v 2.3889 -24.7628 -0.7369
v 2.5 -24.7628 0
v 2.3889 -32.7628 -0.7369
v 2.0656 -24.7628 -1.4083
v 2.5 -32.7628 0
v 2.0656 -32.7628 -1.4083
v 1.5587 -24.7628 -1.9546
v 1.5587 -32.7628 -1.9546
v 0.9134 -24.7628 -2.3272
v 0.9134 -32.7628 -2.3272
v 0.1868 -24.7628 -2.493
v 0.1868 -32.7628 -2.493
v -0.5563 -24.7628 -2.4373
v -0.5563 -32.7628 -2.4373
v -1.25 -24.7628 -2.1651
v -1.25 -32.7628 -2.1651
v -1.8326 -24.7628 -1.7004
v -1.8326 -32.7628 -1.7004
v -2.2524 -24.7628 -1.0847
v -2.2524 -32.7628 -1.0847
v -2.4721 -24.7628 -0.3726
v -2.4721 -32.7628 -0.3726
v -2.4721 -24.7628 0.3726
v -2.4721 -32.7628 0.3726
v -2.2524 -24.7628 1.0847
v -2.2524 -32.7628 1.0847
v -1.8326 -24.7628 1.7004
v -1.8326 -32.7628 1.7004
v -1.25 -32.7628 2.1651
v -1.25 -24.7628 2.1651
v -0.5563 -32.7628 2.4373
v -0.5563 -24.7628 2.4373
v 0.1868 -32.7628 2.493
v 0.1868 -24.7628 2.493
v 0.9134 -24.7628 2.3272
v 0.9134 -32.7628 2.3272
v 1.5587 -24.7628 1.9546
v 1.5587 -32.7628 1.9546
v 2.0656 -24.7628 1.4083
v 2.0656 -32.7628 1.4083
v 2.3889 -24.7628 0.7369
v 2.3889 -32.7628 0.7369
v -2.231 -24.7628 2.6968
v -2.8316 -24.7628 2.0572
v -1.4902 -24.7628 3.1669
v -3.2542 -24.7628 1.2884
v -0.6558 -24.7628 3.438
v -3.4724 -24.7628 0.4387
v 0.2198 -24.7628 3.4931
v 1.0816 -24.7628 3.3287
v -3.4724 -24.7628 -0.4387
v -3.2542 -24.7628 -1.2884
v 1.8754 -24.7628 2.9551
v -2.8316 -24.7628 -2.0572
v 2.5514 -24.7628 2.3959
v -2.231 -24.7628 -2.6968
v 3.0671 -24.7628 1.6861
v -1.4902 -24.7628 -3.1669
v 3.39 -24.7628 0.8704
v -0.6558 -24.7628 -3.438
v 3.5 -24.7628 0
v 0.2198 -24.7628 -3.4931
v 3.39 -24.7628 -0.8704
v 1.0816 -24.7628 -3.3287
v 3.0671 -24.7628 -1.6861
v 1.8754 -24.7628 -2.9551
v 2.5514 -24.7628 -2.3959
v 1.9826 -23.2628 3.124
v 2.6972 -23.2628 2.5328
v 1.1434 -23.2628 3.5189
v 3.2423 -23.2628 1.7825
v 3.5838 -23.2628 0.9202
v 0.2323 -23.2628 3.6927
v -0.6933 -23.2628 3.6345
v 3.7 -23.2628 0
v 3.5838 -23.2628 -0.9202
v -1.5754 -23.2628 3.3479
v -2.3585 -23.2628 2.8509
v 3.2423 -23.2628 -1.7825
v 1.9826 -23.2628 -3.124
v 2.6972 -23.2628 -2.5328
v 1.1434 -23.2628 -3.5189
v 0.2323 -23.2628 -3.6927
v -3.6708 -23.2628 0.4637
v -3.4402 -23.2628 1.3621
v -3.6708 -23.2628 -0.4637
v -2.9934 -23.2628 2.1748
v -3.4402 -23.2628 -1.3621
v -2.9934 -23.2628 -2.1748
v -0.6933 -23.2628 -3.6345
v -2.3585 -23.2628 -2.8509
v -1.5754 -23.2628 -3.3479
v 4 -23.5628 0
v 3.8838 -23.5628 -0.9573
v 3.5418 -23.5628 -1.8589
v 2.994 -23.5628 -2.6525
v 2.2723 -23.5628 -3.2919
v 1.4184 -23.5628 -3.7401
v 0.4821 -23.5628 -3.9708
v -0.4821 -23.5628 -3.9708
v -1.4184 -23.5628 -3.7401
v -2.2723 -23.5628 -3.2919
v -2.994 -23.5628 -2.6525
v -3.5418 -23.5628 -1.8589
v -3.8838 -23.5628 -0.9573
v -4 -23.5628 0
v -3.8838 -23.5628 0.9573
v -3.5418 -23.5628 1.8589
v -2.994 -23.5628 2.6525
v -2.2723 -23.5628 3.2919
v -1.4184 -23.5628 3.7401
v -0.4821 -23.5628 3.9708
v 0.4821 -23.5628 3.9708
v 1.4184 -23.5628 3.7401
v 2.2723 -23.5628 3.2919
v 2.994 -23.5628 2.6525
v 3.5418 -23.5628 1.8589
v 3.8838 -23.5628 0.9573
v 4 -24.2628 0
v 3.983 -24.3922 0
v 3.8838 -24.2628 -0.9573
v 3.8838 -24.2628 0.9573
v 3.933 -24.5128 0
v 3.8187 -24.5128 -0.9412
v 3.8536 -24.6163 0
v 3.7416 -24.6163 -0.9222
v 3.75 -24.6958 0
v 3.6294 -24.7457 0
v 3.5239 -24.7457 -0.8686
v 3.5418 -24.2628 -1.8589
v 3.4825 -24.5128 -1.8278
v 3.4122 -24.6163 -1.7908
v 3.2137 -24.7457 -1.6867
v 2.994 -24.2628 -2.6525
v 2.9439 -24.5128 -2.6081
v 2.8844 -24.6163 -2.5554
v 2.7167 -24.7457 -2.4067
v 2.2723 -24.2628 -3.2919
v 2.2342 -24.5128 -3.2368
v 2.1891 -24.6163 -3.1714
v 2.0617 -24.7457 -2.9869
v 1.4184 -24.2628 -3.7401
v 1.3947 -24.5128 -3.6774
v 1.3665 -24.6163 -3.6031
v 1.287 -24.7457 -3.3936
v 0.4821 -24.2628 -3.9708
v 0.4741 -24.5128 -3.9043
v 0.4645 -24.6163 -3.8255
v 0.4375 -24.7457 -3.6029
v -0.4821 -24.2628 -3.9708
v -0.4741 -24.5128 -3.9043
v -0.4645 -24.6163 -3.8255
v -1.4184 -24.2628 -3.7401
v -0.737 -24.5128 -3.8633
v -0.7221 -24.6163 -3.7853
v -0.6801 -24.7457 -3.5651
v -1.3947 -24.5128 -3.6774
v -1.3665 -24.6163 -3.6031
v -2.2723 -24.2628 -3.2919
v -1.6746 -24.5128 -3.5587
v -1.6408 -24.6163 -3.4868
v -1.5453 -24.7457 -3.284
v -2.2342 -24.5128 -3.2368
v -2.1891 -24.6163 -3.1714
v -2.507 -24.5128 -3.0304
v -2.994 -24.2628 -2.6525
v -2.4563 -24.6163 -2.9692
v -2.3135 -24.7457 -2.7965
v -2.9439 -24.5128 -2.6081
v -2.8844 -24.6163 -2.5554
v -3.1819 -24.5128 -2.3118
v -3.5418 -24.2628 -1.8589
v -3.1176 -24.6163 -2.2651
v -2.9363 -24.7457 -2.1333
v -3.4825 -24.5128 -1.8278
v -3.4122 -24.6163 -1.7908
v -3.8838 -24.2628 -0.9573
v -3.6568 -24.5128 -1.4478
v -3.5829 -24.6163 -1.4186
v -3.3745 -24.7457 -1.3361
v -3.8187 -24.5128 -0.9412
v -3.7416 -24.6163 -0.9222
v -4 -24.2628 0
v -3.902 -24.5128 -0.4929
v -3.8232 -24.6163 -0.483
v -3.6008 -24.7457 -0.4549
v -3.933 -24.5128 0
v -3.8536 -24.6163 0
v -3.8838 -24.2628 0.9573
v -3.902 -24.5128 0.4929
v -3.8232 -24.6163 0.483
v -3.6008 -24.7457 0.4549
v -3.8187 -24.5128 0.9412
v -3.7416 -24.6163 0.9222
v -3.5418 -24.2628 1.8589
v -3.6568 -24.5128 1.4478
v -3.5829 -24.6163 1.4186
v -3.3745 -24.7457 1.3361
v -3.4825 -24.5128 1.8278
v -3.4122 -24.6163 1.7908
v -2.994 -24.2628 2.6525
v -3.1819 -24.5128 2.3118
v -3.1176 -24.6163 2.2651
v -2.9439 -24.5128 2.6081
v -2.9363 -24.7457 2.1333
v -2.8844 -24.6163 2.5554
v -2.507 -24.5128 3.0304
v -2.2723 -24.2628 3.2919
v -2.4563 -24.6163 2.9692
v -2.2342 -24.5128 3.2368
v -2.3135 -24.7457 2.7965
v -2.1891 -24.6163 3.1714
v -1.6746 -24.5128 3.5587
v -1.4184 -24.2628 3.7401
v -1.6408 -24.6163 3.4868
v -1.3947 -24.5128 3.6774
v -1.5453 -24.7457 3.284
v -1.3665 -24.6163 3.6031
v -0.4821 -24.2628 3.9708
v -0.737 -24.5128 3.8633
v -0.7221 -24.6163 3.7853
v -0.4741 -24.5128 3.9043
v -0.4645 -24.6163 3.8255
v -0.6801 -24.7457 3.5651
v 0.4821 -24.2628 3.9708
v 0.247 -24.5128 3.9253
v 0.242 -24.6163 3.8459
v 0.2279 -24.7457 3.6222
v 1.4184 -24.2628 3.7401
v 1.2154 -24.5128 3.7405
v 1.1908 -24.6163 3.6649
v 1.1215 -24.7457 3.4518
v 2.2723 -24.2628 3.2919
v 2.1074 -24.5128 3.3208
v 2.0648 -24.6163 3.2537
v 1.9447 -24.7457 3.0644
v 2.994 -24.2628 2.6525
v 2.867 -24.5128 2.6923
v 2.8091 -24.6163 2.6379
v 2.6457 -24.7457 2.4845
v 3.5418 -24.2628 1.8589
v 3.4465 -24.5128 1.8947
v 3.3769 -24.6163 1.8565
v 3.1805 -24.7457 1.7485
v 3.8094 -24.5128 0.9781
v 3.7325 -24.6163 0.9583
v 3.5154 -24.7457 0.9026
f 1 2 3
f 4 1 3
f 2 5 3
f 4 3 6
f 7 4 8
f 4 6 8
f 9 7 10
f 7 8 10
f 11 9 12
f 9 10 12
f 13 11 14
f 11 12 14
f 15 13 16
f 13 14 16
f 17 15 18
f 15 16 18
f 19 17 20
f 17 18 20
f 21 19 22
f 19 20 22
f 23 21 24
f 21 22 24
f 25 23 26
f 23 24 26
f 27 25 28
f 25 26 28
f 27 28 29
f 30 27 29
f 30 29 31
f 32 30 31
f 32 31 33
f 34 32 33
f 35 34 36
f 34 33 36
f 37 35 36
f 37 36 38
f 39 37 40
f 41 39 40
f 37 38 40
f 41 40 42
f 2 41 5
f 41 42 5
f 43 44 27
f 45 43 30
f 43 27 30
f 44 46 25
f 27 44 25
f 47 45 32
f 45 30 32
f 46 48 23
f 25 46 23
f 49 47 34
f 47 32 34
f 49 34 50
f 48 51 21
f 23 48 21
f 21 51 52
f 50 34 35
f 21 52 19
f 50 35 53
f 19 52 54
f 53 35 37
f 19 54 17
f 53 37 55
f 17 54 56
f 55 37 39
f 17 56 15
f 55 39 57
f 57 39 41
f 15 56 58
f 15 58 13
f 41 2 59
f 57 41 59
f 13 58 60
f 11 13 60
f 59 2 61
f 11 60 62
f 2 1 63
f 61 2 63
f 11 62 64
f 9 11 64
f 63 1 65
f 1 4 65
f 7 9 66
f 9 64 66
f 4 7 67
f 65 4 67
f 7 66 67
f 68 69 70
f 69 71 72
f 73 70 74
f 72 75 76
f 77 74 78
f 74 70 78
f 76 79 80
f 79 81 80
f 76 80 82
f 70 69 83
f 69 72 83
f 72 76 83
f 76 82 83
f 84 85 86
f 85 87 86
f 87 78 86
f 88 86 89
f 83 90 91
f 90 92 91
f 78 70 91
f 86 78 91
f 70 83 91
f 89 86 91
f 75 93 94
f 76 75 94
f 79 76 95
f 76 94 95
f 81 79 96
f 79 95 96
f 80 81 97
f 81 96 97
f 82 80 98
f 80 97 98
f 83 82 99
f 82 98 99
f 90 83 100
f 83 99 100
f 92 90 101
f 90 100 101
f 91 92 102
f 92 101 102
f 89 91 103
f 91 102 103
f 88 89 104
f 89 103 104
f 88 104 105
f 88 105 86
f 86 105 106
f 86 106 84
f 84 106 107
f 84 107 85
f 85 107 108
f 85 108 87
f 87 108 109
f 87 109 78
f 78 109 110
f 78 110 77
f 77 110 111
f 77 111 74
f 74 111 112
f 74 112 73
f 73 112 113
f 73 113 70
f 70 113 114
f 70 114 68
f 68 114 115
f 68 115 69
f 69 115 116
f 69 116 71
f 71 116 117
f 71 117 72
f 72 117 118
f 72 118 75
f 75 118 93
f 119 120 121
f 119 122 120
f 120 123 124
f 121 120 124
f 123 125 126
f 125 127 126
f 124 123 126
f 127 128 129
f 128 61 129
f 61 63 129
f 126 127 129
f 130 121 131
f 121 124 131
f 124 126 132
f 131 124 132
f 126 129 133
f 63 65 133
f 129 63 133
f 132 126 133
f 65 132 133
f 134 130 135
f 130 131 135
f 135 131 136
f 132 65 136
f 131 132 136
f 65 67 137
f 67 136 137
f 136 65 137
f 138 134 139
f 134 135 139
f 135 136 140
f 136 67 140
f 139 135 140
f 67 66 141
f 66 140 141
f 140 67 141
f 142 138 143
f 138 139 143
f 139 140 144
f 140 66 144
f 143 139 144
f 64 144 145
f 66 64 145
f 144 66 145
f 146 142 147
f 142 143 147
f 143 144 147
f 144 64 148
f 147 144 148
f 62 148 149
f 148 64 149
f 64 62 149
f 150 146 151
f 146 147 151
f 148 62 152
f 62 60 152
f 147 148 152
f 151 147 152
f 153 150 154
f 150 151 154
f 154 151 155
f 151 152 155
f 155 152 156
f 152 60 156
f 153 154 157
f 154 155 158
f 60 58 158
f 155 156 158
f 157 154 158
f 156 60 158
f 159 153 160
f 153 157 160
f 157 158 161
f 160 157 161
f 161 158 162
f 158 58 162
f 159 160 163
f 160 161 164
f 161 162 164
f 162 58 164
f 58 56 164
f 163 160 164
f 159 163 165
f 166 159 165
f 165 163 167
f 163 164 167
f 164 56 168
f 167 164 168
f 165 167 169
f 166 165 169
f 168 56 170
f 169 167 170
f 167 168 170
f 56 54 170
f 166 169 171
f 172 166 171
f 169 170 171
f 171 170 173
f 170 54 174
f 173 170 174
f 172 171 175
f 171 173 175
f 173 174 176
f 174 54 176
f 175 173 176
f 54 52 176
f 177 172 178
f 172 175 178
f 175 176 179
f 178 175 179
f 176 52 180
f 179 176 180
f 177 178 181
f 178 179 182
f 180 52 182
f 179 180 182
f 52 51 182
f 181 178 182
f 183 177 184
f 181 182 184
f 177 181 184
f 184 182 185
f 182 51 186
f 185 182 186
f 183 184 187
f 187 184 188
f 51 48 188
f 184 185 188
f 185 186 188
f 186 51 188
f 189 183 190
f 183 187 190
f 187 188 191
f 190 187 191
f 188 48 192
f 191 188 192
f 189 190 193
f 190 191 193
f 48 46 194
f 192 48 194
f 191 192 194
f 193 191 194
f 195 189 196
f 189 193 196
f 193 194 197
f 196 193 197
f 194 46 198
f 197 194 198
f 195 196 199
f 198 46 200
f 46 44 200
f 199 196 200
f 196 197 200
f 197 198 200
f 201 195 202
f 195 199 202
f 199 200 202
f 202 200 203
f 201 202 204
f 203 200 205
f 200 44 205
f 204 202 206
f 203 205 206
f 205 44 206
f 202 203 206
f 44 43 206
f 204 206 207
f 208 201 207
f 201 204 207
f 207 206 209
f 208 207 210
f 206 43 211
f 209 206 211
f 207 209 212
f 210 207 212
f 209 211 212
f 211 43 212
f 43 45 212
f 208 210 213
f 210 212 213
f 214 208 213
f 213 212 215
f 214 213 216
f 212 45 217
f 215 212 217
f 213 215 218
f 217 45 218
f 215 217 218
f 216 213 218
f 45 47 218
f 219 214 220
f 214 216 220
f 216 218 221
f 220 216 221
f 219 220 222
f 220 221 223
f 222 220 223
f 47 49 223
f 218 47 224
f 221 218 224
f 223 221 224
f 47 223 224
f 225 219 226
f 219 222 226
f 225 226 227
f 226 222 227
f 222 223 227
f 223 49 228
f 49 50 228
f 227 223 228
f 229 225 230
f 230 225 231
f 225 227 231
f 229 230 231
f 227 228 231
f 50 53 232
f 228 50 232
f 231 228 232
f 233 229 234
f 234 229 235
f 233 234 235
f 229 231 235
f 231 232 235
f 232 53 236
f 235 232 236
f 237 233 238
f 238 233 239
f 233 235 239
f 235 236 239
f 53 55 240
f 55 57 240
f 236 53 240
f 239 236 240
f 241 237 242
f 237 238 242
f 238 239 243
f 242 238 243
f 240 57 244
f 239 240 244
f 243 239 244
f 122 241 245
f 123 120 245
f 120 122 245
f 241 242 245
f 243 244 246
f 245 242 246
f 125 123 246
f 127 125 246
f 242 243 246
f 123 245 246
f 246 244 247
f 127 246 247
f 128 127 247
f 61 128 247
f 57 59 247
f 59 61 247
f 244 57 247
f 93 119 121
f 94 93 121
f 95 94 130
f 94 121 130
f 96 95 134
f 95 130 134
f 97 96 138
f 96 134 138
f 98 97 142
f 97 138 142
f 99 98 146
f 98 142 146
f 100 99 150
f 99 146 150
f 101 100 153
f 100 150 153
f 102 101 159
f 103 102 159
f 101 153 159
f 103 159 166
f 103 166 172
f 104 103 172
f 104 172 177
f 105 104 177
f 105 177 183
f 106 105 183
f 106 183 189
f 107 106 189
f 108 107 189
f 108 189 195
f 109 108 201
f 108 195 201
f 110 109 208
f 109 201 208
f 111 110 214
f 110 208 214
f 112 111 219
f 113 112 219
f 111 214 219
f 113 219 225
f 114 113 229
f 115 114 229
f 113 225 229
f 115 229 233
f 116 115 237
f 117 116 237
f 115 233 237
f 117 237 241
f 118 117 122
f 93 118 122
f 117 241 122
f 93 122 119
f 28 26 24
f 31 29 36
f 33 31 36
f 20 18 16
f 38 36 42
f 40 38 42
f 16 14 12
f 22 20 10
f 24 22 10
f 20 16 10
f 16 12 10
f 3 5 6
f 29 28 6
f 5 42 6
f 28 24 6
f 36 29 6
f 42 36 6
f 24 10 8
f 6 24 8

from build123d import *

# Parameters (mm, degrees)
CHAMFER_1_SIZE = 0.3
FILLET_1_R     = 0.5


with BuildPart() as part:
    # 草图2 → 旋转1 (revolve)
    with BuildSketch(Plane.XY):
        Polygon((0, -23.262759575), (4, -23.262759575), (4, -24.762759575), (2.5, -24.762759575), (2.5, -32.762759575), (0, -32.762759575), align=None)
    revolve(axis=Axis((0, -1000, 0), (0, 1, 0)))

    # 倒角1
    chamfer_1_edges = [part.edges().sort_by_distance(p)[0] for p in [
        (-4, -23.262759575, 0),
    ]]
    chamfer(chamfer_1_edges, length=CHAMFER_1_SIZE)

    # 圆角1
    fillet_1_edges = [part.edges().sort_by_distance(p)[0] for p in [
        (-4, -24.762759575, 0),
    ]]
    fillet(fillet_1_edges, radius=FILLET_1_R)


solid = part.part
